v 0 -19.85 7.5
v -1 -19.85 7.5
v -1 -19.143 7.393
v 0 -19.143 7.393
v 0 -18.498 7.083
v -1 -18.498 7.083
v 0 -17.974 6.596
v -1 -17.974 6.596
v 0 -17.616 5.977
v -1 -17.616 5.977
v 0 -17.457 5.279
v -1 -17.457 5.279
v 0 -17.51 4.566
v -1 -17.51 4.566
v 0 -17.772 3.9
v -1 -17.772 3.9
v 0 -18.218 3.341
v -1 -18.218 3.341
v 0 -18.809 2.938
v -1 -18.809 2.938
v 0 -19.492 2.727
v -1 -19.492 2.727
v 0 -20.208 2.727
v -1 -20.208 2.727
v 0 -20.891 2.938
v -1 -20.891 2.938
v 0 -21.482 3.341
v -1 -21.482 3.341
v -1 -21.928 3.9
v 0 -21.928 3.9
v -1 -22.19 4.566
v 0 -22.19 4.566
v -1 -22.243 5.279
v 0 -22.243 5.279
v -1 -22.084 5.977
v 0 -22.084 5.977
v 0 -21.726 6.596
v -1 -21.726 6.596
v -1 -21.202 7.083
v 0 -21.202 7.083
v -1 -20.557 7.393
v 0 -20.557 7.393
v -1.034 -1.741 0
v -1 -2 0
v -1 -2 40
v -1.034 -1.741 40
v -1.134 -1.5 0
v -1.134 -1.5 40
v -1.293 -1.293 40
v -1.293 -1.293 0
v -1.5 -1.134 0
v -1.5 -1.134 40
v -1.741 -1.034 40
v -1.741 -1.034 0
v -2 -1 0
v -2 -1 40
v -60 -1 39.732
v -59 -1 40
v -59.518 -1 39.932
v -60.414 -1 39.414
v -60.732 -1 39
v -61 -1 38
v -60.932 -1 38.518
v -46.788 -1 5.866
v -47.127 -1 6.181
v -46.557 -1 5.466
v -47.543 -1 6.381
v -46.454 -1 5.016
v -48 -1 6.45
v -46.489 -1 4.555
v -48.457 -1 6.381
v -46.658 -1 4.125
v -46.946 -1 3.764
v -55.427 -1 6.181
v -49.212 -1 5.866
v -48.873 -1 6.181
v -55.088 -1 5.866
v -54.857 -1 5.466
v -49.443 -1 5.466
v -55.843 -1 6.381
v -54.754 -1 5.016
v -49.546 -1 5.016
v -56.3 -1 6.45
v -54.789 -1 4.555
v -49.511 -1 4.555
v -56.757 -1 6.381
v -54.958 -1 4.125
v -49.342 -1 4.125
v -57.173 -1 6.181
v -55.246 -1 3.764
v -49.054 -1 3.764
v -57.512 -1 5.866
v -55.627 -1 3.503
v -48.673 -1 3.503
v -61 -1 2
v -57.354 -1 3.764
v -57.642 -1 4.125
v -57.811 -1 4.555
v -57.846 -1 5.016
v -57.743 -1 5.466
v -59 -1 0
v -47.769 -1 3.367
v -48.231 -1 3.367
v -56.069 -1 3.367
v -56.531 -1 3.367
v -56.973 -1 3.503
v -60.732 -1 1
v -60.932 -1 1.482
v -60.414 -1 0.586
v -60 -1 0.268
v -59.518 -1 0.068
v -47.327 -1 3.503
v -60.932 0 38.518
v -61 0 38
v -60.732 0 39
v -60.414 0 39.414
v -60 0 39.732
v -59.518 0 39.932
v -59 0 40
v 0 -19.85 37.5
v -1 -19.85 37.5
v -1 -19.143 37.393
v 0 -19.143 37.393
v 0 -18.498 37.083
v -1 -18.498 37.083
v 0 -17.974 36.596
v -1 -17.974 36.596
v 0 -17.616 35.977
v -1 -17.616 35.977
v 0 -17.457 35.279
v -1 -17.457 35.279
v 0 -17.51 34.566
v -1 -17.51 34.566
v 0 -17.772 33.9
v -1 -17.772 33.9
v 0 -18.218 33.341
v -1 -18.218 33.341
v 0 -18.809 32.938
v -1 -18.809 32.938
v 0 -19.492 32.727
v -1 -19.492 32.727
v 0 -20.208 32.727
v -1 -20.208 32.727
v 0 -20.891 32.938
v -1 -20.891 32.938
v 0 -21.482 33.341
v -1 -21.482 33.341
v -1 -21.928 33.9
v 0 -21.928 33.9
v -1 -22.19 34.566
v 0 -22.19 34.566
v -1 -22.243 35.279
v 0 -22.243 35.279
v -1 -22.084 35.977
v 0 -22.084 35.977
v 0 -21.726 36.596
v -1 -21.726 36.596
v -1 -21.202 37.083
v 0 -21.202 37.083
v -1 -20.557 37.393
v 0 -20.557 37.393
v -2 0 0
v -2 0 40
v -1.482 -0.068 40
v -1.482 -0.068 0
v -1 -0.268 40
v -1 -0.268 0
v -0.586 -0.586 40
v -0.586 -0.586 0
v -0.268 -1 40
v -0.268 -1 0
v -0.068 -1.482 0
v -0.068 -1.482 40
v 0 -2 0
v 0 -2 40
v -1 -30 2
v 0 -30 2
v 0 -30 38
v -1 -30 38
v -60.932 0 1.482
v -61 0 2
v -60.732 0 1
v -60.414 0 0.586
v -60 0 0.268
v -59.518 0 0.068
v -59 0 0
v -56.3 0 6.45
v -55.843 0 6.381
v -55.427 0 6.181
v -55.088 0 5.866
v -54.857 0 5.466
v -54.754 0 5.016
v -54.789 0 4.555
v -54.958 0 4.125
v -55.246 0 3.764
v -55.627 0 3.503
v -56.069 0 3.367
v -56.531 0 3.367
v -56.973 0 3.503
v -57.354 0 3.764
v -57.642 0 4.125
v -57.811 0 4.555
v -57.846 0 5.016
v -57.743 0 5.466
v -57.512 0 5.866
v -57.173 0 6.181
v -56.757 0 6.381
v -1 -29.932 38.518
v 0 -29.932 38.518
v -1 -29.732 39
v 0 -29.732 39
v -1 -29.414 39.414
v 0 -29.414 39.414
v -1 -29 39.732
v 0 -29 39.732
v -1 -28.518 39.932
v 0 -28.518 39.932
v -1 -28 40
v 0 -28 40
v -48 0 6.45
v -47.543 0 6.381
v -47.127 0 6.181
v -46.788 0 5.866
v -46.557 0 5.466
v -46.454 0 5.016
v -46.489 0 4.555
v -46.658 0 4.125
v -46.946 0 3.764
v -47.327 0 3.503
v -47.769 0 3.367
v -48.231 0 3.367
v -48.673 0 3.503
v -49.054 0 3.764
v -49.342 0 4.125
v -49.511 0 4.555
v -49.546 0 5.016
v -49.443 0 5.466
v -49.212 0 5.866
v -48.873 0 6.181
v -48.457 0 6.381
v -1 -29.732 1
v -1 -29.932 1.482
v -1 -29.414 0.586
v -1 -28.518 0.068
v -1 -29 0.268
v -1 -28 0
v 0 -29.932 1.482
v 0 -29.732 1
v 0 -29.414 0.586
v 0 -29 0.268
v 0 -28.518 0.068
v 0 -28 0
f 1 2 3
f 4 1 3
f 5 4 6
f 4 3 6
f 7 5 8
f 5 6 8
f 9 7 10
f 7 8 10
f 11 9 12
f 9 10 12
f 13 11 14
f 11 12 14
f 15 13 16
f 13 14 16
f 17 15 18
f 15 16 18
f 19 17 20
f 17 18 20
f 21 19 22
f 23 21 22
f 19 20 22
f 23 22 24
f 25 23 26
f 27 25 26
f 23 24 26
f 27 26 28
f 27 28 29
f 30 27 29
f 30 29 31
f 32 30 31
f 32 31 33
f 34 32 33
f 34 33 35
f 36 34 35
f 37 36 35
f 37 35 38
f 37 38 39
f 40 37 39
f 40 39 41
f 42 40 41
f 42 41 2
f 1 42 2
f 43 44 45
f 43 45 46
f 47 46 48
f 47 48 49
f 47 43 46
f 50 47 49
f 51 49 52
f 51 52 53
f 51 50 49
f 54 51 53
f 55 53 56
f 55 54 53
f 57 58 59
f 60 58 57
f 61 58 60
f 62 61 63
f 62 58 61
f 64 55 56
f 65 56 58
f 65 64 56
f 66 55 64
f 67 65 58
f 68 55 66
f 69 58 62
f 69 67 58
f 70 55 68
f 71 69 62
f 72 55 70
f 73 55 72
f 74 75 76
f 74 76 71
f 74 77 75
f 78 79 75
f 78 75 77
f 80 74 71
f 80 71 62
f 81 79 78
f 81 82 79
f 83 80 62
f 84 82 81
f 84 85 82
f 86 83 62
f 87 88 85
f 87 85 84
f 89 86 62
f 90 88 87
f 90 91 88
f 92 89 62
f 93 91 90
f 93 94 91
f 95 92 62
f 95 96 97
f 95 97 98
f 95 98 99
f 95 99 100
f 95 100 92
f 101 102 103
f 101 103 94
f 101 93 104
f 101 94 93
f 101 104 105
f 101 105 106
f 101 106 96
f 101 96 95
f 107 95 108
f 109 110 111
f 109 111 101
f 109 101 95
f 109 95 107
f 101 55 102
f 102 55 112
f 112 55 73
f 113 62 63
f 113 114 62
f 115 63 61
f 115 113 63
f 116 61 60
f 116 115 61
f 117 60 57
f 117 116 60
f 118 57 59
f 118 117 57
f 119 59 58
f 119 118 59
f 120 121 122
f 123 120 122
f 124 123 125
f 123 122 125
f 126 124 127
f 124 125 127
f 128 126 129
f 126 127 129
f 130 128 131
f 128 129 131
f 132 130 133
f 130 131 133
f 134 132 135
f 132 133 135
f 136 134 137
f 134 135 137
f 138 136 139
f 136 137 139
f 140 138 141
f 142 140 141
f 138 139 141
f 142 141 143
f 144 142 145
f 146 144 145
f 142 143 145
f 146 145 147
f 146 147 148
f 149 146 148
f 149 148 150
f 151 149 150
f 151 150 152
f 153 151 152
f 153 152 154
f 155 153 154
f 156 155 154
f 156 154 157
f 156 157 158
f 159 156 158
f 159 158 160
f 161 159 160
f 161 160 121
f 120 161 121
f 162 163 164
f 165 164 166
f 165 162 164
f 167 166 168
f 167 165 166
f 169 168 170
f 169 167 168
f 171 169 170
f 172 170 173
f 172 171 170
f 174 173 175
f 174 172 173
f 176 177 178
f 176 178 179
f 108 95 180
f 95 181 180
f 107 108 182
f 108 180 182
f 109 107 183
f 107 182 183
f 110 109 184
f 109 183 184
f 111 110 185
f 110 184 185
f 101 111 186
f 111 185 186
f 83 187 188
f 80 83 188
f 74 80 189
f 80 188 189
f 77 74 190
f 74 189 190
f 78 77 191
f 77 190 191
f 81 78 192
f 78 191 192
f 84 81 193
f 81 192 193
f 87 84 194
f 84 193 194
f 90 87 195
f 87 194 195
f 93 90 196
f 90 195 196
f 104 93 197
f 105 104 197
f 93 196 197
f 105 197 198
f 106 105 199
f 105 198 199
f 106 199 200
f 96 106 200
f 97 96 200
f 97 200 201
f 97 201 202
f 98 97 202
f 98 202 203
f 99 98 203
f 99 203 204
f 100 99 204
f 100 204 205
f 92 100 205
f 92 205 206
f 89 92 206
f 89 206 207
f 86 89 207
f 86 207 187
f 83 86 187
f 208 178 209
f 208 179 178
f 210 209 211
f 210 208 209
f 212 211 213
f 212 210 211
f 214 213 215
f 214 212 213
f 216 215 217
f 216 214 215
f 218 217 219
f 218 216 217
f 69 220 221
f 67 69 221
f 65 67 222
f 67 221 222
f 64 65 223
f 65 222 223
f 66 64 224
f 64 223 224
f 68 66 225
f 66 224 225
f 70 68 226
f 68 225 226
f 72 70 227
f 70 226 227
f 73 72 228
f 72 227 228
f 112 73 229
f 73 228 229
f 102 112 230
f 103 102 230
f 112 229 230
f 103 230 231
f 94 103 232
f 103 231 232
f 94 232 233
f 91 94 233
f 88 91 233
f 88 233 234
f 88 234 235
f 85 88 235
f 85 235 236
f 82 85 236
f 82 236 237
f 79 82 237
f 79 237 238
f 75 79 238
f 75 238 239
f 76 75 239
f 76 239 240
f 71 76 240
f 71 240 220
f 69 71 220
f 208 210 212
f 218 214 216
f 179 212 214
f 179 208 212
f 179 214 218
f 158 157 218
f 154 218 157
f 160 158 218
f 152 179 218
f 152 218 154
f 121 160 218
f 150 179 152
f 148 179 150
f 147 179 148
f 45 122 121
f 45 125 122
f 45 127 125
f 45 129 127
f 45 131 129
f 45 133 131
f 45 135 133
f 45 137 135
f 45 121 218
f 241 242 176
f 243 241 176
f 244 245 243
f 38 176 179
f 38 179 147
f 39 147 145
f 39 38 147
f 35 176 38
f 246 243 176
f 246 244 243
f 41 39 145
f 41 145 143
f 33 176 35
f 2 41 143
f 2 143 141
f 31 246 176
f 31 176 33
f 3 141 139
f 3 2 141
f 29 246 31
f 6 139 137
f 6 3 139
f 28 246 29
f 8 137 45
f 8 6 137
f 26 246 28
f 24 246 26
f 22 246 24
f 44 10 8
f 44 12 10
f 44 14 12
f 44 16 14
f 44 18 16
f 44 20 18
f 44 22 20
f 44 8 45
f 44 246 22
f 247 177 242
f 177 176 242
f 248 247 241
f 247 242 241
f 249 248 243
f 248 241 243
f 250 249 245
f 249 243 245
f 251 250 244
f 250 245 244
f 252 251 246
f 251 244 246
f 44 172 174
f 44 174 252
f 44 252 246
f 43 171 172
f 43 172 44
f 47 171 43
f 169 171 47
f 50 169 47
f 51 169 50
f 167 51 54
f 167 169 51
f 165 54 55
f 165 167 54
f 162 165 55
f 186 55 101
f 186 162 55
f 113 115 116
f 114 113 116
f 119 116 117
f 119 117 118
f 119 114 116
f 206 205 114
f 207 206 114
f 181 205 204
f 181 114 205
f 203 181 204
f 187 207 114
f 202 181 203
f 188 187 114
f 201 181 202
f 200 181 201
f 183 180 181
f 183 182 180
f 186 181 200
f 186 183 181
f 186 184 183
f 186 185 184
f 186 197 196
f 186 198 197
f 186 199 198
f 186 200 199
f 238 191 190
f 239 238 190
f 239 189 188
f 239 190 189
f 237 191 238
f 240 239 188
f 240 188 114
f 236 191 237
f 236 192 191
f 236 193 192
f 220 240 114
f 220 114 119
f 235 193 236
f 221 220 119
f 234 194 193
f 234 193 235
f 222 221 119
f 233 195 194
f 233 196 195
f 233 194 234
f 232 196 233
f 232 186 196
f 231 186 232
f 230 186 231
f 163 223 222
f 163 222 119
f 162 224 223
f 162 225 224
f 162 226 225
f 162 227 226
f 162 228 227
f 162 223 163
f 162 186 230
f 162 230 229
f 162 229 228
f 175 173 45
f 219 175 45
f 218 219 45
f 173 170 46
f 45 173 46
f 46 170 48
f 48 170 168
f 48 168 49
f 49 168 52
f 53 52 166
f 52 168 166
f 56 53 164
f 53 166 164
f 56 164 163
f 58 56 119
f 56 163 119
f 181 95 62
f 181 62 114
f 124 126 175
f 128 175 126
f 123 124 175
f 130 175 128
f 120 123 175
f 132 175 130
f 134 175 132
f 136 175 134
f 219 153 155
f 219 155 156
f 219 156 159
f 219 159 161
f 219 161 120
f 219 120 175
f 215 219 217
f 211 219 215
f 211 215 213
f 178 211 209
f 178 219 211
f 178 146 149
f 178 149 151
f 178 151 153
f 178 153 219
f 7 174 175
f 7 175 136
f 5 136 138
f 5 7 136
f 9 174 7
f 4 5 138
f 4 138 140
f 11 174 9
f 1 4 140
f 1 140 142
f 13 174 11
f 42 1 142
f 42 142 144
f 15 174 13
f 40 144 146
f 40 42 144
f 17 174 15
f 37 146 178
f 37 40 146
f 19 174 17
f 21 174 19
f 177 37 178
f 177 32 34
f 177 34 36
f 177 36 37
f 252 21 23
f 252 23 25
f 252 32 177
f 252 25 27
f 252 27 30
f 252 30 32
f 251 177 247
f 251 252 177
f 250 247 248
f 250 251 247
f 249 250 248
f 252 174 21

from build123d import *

# Parameters (mm, degrees)
BASE_FLANGE1_DEPTH   = 40
FILLET1_R            = 2
SKETCH6_R            = 1.55
CUT_EXTRUDE1_DEPTH   = 10
M4_CLEARANCE_HOLE1_D = 4.8


# Sheet-metal steps are written as plain solids
with BuildPart() as part:
    # Sketch1 → Base-Flange1 (new body)
    with BuildSketch(Plane.XY):
        with BuildLine():
            Line((-61, 0), (-2, 0))
            ThreePointArc((-2, 0), (-0.585786438, -0.585786438), (0, -2))
            Line((0, -2), (0, -30))
            Line((0, -30), (-1, -30))
            Line((-1, -30), (-1, -2))
            ThreePointArc((-1, -2), (-1.292893219, -1.292893219), (-2, -1))
            Line((-2, -1), (-61, -1))
            Line((-61, -1), (-61, 0))
        make_face()
    extrude(amount=BASE_FLANGE1_DEPTH)

    # Fillet1
    fillet1_edges = [part.edges().sort_by_distance(p)[0] for p in [
        (-61, -0.5, 40),
        (-61, -0.5, 0),
        (-0.5, -30, 40),
        (-0.5, -30, 0),
    ]]
    fillet(fillet1_edges, radius=FILLET1_R)

    # Sketch6 → Cut-Extrude1 (cut)
    with BuildSketch(Plane(origin=(0, 0, 0), x_dir=(1, 0, 0), z_dir=(0, 1, 0))):
        with Locations(Location((-56.3, -4.9, 0), (0, 0, 270))):
            Circle(SKETCH6_R)
        with Locations(Location((-48, -4.9, 0), (0, 0, 270))):
            Circle(SKETCH6_R)
    extrude(amount=-CUT_EXTRUDE1_DEPTH, mode=Mode.SUBTRACT)

    # M4 Clearance Hole1 (through all)
    with Locations(Plane(origin=(0, 0, 0), x_dir=(0, 0, -1), z_dir=(1, 0, 0))):
        with Locations((-35.1, -19.849994255), (-5.1, -19.849994255)):
            Hole(M4_CLEARANCE_HOLE1_D / 2)


solid = part.part
